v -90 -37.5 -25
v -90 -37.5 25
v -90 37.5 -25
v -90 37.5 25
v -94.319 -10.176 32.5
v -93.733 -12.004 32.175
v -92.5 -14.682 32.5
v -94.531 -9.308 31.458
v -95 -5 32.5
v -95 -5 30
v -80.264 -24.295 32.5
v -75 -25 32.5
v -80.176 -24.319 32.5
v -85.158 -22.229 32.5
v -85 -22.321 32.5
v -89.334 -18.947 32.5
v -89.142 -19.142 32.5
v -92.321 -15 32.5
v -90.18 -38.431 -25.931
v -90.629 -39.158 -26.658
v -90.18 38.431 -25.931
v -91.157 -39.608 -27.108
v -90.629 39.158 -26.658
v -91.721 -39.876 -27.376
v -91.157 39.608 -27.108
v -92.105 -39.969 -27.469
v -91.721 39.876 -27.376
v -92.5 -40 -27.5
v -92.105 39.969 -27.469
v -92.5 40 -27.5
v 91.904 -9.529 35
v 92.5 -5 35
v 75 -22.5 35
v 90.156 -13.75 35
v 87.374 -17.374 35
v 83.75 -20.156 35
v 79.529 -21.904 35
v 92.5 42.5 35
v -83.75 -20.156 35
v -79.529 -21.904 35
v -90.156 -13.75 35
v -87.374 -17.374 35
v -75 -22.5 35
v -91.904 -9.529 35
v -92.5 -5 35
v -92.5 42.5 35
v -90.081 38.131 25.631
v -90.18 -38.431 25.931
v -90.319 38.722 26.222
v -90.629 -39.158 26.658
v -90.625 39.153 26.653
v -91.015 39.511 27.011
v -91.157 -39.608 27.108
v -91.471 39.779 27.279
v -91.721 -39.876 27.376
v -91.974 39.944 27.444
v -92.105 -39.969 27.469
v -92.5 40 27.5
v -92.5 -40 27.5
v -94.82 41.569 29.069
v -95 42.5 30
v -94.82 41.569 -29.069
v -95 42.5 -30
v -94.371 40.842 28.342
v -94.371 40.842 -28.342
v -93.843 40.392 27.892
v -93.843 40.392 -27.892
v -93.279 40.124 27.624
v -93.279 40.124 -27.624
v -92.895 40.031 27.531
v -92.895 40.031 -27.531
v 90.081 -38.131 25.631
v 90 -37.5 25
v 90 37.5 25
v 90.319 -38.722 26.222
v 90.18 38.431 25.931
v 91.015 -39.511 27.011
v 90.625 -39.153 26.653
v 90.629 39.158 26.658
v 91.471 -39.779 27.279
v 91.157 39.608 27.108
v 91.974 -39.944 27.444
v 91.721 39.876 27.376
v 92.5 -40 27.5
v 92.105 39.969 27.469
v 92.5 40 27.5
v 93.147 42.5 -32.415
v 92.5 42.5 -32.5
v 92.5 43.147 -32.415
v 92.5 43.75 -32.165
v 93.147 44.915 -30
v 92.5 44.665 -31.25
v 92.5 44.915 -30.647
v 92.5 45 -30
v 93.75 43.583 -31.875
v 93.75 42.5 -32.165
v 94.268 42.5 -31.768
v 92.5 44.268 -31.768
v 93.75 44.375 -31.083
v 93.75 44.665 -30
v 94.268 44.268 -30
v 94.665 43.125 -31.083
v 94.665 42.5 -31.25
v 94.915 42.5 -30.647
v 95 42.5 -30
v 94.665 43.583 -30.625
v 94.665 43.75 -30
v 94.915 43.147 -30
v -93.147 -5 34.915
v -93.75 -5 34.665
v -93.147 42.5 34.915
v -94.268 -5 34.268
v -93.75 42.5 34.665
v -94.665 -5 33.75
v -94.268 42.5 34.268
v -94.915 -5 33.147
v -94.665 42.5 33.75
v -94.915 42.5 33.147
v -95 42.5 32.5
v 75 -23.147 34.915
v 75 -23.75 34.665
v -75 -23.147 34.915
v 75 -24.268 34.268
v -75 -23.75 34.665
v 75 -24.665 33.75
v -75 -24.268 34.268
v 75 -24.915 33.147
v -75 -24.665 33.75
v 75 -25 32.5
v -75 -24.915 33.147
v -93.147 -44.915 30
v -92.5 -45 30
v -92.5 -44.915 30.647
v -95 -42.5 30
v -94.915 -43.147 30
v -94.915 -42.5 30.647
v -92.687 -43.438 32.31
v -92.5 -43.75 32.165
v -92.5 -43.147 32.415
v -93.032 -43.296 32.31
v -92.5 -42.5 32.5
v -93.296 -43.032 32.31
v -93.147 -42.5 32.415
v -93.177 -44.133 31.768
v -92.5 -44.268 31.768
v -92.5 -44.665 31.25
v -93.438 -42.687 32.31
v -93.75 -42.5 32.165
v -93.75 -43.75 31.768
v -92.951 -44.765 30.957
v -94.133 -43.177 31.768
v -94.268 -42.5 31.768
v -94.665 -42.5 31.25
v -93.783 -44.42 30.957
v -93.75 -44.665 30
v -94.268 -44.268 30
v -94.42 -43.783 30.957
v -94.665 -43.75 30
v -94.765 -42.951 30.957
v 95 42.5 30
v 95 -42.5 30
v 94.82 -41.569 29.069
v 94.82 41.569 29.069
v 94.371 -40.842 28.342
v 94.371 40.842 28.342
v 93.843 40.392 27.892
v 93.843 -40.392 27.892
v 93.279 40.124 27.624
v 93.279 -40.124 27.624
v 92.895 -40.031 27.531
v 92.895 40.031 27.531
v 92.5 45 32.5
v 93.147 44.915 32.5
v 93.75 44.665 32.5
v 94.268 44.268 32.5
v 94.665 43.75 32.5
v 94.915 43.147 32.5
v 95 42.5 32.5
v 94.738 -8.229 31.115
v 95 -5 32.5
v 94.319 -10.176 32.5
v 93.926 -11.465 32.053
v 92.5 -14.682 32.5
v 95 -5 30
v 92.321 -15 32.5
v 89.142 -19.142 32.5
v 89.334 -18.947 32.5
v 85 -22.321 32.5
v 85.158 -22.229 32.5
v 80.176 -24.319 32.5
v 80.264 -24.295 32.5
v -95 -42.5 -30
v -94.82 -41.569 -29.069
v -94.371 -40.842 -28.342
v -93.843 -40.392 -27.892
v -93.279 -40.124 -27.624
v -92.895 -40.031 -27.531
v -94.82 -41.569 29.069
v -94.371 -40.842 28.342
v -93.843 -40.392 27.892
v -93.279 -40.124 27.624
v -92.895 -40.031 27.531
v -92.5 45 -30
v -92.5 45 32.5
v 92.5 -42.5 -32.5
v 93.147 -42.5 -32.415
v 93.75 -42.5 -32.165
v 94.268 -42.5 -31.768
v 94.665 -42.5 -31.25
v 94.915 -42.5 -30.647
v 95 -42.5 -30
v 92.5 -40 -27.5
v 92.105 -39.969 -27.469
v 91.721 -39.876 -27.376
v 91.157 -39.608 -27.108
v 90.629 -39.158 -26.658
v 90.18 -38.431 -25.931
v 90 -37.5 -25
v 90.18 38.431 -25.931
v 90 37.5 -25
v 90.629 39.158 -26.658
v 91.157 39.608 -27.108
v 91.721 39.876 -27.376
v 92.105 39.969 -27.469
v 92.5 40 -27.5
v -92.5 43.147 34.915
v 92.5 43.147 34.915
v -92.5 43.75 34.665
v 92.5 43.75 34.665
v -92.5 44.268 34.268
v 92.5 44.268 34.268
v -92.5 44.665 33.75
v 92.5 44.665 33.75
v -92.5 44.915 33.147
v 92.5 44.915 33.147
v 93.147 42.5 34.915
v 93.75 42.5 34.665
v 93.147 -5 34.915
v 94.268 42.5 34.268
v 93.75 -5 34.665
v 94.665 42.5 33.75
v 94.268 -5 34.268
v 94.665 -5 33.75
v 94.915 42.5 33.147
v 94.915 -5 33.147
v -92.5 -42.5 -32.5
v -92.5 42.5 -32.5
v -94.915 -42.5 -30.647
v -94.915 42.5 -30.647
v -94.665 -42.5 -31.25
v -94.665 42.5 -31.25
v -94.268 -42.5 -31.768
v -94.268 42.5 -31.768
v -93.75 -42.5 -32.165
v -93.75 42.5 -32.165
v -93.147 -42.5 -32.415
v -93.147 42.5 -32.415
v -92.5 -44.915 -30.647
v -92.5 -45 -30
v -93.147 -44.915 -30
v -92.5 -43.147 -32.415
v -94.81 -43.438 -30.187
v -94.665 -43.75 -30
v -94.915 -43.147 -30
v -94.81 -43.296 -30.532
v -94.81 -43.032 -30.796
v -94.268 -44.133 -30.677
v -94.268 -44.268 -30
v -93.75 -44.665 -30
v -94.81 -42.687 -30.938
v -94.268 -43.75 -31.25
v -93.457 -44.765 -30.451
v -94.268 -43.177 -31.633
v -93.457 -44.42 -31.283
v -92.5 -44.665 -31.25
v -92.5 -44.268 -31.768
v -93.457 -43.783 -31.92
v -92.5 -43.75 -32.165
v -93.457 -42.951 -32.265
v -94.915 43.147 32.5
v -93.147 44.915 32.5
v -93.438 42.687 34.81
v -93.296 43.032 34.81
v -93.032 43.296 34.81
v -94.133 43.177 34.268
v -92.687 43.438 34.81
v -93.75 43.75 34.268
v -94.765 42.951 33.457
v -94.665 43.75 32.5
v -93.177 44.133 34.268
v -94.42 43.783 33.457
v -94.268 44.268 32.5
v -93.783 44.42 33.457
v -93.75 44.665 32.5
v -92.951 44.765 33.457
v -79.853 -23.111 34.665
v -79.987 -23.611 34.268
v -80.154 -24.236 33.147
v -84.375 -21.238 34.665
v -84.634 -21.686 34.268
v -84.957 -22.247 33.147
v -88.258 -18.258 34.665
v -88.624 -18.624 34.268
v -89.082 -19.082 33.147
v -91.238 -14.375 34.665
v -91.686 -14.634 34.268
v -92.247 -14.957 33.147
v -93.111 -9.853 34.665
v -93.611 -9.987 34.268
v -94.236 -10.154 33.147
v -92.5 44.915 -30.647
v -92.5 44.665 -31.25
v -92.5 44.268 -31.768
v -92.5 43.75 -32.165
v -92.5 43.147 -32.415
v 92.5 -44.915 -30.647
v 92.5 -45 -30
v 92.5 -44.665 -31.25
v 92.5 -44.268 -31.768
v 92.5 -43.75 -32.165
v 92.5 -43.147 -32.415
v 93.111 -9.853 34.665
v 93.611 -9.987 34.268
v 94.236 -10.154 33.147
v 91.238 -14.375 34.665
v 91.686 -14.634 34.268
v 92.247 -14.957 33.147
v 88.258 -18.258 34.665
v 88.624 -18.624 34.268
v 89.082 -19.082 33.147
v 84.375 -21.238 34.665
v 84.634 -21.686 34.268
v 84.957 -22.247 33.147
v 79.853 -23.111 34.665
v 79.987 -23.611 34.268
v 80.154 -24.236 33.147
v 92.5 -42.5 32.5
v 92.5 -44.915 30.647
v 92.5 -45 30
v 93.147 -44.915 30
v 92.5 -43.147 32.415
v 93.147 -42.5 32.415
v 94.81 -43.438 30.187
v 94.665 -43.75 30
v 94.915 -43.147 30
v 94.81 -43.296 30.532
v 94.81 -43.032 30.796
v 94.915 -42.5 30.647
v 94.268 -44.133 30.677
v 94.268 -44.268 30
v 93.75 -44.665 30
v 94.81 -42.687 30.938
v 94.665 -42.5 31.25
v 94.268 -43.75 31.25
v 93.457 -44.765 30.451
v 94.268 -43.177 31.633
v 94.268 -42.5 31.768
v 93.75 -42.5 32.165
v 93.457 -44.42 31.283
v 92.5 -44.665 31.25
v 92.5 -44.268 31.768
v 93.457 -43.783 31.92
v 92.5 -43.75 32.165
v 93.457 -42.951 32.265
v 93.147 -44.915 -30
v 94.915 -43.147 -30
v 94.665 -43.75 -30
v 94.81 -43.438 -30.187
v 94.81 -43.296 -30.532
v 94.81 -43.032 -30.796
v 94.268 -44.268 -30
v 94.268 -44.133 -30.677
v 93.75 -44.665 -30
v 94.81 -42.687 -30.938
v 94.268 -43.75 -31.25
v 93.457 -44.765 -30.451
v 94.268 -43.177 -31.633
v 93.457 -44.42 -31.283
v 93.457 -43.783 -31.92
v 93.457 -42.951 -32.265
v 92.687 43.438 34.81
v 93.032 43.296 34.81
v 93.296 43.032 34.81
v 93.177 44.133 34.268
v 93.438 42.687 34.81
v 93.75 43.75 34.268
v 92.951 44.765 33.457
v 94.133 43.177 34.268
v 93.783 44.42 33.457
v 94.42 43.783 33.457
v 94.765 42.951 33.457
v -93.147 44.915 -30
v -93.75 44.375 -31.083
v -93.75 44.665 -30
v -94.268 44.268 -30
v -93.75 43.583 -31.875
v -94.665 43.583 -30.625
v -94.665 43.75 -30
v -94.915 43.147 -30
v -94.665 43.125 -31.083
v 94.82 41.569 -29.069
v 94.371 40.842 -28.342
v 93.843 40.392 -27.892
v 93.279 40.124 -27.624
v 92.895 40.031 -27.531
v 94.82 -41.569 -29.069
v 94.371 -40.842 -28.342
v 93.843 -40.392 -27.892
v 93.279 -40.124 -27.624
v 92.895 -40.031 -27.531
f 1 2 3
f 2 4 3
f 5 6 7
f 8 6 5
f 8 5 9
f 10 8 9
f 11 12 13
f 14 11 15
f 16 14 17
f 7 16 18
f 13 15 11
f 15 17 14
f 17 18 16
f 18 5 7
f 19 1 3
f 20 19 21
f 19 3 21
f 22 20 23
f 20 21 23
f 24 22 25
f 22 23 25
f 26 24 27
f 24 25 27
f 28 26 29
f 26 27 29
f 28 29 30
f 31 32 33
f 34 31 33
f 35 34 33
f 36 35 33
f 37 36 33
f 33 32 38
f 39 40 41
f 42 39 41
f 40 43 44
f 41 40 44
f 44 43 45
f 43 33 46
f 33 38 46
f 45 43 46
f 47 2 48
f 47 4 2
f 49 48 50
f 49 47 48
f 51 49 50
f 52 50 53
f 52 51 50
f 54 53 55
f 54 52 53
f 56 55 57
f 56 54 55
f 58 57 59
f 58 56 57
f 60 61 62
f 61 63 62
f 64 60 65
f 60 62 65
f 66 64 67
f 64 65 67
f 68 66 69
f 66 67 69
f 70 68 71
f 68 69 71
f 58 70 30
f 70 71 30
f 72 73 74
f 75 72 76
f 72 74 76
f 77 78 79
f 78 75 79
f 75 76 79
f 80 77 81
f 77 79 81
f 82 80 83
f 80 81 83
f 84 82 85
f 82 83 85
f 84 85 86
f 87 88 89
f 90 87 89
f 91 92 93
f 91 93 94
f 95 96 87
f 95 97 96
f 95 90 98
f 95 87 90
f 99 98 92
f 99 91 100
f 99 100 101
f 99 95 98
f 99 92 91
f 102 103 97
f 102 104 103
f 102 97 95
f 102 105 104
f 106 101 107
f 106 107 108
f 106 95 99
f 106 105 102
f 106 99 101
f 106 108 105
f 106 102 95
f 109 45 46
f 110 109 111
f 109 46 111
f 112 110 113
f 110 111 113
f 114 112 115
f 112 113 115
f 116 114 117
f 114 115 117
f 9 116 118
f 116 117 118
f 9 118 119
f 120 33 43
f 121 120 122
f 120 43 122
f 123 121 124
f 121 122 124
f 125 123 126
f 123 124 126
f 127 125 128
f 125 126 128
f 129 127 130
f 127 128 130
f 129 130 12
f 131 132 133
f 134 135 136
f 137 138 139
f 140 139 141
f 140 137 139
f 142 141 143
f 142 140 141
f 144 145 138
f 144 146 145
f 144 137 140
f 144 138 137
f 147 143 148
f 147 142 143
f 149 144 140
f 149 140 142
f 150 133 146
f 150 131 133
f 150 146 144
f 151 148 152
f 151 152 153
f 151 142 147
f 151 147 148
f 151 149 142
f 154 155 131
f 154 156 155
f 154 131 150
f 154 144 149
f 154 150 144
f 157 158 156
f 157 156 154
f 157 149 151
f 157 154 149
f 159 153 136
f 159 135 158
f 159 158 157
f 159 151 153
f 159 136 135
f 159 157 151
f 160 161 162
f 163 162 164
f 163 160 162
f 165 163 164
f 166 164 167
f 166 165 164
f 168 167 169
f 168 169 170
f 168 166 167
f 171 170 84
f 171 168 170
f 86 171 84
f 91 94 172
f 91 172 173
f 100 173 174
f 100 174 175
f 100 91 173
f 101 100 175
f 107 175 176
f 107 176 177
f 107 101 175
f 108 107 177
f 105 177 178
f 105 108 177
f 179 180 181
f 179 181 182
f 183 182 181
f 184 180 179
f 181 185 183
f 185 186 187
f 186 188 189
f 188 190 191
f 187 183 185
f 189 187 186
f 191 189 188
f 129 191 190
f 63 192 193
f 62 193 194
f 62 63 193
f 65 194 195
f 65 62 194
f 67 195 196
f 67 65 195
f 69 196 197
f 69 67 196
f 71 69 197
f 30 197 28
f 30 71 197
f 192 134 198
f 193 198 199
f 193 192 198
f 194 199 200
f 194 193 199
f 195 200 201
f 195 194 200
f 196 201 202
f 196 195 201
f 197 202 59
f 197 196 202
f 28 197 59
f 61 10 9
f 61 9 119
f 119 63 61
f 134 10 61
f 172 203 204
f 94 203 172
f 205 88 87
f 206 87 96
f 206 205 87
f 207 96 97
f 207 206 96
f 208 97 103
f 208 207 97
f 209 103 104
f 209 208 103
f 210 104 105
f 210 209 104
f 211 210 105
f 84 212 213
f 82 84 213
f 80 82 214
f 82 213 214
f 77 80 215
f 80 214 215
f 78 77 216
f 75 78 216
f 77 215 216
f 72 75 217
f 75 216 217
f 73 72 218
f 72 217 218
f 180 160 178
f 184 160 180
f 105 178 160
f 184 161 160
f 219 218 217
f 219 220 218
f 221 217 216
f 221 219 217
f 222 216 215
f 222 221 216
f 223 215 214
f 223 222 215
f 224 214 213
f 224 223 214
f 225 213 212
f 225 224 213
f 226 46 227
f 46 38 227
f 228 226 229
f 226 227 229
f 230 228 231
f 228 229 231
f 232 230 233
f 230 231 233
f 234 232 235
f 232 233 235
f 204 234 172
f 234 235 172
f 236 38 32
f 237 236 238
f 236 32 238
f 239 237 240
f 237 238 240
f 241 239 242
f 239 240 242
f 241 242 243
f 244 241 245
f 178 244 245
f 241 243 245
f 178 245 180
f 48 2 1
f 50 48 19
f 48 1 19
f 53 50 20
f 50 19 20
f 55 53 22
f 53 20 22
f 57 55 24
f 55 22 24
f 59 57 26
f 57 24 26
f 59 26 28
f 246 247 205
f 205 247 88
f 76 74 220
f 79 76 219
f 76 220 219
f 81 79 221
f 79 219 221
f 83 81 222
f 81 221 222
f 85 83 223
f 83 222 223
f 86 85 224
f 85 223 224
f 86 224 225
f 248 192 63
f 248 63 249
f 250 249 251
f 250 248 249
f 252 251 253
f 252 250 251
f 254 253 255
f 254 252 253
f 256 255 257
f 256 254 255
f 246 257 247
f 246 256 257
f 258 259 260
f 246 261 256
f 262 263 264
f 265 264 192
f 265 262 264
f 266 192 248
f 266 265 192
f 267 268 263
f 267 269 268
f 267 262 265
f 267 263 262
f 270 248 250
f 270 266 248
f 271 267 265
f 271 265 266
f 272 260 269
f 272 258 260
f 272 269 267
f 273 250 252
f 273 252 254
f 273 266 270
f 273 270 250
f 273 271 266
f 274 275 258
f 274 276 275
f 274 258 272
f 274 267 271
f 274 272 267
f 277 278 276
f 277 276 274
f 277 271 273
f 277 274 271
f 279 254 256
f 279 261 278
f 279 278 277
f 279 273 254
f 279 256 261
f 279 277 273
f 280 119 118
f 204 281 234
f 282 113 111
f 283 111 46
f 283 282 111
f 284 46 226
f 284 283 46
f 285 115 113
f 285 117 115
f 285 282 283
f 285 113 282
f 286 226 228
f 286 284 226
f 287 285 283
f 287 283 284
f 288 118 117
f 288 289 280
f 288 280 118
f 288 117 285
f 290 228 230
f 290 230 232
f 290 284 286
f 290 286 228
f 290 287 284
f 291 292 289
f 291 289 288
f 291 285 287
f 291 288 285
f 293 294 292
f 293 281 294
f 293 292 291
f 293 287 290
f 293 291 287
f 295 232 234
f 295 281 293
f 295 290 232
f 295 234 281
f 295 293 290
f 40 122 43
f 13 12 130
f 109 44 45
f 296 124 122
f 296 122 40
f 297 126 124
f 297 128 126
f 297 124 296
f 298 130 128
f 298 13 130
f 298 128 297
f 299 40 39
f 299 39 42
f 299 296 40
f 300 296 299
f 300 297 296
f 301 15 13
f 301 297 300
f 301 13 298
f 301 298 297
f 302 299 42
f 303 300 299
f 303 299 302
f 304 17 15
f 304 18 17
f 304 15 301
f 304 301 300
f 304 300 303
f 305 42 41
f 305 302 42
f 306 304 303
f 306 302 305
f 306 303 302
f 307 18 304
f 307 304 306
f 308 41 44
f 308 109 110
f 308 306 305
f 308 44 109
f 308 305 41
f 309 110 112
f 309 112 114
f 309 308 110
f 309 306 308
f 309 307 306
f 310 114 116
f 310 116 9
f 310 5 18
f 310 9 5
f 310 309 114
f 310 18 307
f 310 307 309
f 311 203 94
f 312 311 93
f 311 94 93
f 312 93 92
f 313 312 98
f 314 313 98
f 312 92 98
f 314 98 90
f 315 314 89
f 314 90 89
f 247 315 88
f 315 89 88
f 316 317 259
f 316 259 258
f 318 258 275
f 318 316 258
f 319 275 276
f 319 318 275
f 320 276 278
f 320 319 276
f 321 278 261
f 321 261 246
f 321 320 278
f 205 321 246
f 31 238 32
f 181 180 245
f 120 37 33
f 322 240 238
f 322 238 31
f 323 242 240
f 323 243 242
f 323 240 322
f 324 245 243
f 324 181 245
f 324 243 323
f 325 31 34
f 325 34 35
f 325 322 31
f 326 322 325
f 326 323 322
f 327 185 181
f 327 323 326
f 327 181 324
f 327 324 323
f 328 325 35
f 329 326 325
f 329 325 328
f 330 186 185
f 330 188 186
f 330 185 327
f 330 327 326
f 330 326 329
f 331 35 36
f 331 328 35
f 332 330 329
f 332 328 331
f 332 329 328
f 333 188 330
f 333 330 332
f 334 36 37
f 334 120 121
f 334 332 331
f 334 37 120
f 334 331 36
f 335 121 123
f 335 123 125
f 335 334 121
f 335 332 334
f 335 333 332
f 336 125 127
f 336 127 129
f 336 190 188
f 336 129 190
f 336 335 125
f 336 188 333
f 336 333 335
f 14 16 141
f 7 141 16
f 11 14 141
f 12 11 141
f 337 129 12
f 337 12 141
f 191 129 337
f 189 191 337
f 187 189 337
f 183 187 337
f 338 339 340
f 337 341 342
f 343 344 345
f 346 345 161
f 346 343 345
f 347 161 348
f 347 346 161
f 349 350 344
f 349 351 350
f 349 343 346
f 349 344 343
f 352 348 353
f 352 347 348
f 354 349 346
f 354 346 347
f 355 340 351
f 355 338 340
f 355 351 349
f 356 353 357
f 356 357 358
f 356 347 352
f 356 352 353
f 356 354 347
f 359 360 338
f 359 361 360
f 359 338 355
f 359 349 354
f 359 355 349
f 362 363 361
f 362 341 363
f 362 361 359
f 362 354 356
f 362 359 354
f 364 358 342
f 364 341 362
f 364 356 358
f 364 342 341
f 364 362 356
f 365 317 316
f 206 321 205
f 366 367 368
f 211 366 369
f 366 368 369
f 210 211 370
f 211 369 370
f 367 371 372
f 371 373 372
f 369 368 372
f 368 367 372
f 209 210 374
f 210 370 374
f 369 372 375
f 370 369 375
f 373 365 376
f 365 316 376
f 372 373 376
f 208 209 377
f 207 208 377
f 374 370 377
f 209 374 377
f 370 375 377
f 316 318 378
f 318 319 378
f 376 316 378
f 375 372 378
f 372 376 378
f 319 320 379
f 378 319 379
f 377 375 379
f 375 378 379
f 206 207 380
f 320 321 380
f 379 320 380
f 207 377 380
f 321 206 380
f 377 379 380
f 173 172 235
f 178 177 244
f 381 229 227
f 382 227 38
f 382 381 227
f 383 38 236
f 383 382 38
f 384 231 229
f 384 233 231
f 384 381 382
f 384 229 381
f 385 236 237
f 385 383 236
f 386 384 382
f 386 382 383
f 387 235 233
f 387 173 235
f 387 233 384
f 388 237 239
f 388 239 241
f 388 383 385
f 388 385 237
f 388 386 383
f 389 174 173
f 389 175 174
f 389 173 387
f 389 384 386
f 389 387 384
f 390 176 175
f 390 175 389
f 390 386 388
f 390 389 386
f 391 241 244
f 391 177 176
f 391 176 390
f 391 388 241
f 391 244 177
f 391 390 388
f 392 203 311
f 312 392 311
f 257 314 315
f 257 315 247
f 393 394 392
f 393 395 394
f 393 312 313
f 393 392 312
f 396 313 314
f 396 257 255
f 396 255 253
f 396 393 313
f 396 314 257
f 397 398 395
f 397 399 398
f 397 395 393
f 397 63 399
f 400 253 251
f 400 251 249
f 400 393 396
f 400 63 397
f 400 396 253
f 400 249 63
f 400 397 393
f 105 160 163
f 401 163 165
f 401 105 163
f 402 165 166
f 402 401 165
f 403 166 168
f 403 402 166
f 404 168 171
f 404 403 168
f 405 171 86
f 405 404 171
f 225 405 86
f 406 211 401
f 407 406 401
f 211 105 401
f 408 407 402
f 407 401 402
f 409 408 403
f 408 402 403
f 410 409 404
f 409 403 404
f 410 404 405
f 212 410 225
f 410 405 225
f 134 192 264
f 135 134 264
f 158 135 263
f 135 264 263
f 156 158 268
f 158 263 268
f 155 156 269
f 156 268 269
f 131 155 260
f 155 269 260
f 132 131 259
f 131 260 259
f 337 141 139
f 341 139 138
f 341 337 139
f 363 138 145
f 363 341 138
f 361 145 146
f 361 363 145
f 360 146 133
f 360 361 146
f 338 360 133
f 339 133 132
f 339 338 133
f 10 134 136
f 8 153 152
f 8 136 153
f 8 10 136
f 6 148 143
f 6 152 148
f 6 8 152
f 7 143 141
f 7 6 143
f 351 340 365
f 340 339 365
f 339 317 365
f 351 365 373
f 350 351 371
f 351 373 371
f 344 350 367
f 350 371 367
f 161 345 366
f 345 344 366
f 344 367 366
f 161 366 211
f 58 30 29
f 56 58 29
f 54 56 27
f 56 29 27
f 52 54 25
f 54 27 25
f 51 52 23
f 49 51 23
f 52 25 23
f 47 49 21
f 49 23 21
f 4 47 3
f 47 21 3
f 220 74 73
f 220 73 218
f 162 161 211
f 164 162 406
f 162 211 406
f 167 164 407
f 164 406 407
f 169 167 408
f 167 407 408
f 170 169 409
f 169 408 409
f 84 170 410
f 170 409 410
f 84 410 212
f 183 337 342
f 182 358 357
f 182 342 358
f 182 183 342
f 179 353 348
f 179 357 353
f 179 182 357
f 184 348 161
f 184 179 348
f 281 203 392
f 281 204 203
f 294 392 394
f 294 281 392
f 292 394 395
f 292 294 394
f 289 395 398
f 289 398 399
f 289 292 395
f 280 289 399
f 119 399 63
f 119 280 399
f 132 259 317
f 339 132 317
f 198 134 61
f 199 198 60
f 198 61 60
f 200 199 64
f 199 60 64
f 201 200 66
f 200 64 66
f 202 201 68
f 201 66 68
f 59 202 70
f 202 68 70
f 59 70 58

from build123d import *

# Parameters (mm, degrees)
SKETCH_1_W          = 190
SKETCH_1_H          = 65
EXTRUDE_1_DEPTH     = 45
SKETCH_3_W          = 55
SKETCH_3_H          = 80
CUT_EXTRUDE_1_DEPTH = 5
EXTRUDE_2_DEPTH     = 2.5
FILLET_2_R          = 2.5
FILLET_3_R          = 2.5
FILLET_4_R          = 2.5


# Some blends are built 0.0001 mm under size
with BuildPart() as part:
    # ｽｹｯﾁ1 → ﾎﾞｽ - 押し出し1 (new, symmetric)
    with BuildSketch(Plane(origin=(0, 0, 0), x_dir=(1, 0, 0), z_dir=(0, 1, 0))):
        Rectangle(SKETCH_1_W, SKETCH_1_H)
    extrude(amount=EXTRUDE_1_DEPTH, both=True)

    # ｽｹｯﾁ3 → ｶｯﾄ - 押し出し1 (cut)
    with BuildSketch(Plane(origin=(95, 0, 0), x_dir=(0, 0, -1), z_dir=(1, 0, 0))):
        Rectangle(SKETCH_3_W, SKETCH_3_H)
    cut_extrude_1 = extrude(amount=-CUT_EXTRUDE_1_DEPTH, mode=Mode.SUBTRACT)

    # ﾐﾗｰ1: ｶｯﾄ - 押し出し1 across plane
    add(cut_extrude_1.mirror(Plane(origin=(0, 0, 0), x_dir=(0, 0, 1), z_dir=(1, 0, 0))), mode=Mode.SUBTRACT)

    # ｽｹｯﾁ4 → ﾎﾞｽ - 押し出し2 (add)
    with BuildSketch(Plane.XY.offset(32.5)):
        with BuildLine():
            Line((-95, 45), (95, 45))
            Line((95, 45), (95, -5))
            ThreePointArc((95, -5), (89.142135624, -19.142135624), (75, -25))
            Line((75, -25), (-75, -25))
            ThreePointArc((-75, -25), (-89.142135624, -19.142135624), (-95, -5))
            Line((-95, -5), (-95, 45))
        make_face()
    extrude(amount=EXTRUDE_2_DEPTH)

    # ﾌｨﾚｯﾄ2
    fillet_2_edges = [part.edges().sort_by_distance(p)[0] for p in [
        (0, -45, -32.5),
        (-95, -45, 0),
        (0, -45, 32.5),
        (95, -45, 0),
        (-90, -40, 0),
        (-90, 0, -27.5),
        (-90, 40, 0),
        (-90, 0, 27.5),
        (90, 40, 0),
        (90, 0, -27.5),
        (90, -40, 0),
        (90, 0, 27.5),
        (95, -25, 32.5),
        (95, 0, -32.5),
        (95, 45, 1.25),
        (95, 0, 27.5),
        (95, -40, 0),
        (95, 0, -27.5),
        (95, 40, 0),
        (-95, -25, 32.5),
        (-95, 0, -32.5),
        (-95, 45, 1.25),
        (-95, 0, -27.5),
        (-95, -40, 0),
        (-95, 0, 27.5),
        (-95, 40, 0),
    ]]
    fillet(fillet_2_edges, radius=FILLET_2_R - 0.0001)  # a hair under: the kernel refuses the full size

    # ﾌｨﾚｯﾄ3
    fillet_3_edges = [part.edges().sort_by_distance(p)[0] for p in [
        (94.267796242, 44.267796242, 35),
        (95, 18.75005, 35),
        (89.142135624, -19.142135624, 35),
        (0, -25, 35),
        (-89.142135624, -19.142135624, 35),
        (-95, 18.75005, 35),
        (-94.267796242, 44.267796242, 35),
        (0, 45, 35),
    ]]
    fillet(fillet_3_edges, radius=FILLET_3_R - 0.0001)  # a hair under: the kernel refuses the full size

    # ﾌｨﾚｯﾄ4
    # the kernel refuses this fillet: 2.5 mm, written as the material it takes off along each edge
    with BuildSketch(Plane(origin=(95, 42.5, -30), x_dir=(0, 0, -1), z_dir=(0, -1, 0))) as fillet_4_piece_1:
        with BuildLine():
            CenterArc((0.0001, -2.4999), 2.4999, 0, 90)
            Line((2.5, -2.4999), (2.5, 0))
            Line((2.5, 0), (0.0001, 0))
        make_face()
    revolve(axis=Axis((95, 42.5, -30), (1, 0, 0)), revolution_arc=90, mode=Mode.SUBTRACT)
    with BuildSketch(Plane(origin=(-95, 42.5, -30), x_dir=(0, 1, 0), z_dir=(0, 0, 1))) as fillet_4_piece_2:
        with BuildLine():
            CenterArc((0.0001, -2.4999), 2.4999, 0, 90)
            Line((2.5, -2.4999), (2.5, 0))
            Line((2.5, 0), (0.0001, 0))
        make_face()
    revolve(axis=Axis((-95, 42.5, -30), (-1, 0, 0)), revolution_arc=90, mode=Mode.SUBTRACT)
    with BuildSketch(Plane(origin=(95, 45, -32.5), x_dir=(0, 0, 1), z_dir=(-1, 0, 0))) as fillet_4_piece_3:
        with BuildLine():
            CenterArc((FILLET_4_R, -FILLET_4_R), FILLET_4_R, 90, 90)
            Line((0, -FILLET_4_R), (0, 0))
            Line((0, 0), (FILLET_4_R, 0))
        make_face()
    extrude(amount=190, mode=Mode.SUBTRACT)


solid = part.part
